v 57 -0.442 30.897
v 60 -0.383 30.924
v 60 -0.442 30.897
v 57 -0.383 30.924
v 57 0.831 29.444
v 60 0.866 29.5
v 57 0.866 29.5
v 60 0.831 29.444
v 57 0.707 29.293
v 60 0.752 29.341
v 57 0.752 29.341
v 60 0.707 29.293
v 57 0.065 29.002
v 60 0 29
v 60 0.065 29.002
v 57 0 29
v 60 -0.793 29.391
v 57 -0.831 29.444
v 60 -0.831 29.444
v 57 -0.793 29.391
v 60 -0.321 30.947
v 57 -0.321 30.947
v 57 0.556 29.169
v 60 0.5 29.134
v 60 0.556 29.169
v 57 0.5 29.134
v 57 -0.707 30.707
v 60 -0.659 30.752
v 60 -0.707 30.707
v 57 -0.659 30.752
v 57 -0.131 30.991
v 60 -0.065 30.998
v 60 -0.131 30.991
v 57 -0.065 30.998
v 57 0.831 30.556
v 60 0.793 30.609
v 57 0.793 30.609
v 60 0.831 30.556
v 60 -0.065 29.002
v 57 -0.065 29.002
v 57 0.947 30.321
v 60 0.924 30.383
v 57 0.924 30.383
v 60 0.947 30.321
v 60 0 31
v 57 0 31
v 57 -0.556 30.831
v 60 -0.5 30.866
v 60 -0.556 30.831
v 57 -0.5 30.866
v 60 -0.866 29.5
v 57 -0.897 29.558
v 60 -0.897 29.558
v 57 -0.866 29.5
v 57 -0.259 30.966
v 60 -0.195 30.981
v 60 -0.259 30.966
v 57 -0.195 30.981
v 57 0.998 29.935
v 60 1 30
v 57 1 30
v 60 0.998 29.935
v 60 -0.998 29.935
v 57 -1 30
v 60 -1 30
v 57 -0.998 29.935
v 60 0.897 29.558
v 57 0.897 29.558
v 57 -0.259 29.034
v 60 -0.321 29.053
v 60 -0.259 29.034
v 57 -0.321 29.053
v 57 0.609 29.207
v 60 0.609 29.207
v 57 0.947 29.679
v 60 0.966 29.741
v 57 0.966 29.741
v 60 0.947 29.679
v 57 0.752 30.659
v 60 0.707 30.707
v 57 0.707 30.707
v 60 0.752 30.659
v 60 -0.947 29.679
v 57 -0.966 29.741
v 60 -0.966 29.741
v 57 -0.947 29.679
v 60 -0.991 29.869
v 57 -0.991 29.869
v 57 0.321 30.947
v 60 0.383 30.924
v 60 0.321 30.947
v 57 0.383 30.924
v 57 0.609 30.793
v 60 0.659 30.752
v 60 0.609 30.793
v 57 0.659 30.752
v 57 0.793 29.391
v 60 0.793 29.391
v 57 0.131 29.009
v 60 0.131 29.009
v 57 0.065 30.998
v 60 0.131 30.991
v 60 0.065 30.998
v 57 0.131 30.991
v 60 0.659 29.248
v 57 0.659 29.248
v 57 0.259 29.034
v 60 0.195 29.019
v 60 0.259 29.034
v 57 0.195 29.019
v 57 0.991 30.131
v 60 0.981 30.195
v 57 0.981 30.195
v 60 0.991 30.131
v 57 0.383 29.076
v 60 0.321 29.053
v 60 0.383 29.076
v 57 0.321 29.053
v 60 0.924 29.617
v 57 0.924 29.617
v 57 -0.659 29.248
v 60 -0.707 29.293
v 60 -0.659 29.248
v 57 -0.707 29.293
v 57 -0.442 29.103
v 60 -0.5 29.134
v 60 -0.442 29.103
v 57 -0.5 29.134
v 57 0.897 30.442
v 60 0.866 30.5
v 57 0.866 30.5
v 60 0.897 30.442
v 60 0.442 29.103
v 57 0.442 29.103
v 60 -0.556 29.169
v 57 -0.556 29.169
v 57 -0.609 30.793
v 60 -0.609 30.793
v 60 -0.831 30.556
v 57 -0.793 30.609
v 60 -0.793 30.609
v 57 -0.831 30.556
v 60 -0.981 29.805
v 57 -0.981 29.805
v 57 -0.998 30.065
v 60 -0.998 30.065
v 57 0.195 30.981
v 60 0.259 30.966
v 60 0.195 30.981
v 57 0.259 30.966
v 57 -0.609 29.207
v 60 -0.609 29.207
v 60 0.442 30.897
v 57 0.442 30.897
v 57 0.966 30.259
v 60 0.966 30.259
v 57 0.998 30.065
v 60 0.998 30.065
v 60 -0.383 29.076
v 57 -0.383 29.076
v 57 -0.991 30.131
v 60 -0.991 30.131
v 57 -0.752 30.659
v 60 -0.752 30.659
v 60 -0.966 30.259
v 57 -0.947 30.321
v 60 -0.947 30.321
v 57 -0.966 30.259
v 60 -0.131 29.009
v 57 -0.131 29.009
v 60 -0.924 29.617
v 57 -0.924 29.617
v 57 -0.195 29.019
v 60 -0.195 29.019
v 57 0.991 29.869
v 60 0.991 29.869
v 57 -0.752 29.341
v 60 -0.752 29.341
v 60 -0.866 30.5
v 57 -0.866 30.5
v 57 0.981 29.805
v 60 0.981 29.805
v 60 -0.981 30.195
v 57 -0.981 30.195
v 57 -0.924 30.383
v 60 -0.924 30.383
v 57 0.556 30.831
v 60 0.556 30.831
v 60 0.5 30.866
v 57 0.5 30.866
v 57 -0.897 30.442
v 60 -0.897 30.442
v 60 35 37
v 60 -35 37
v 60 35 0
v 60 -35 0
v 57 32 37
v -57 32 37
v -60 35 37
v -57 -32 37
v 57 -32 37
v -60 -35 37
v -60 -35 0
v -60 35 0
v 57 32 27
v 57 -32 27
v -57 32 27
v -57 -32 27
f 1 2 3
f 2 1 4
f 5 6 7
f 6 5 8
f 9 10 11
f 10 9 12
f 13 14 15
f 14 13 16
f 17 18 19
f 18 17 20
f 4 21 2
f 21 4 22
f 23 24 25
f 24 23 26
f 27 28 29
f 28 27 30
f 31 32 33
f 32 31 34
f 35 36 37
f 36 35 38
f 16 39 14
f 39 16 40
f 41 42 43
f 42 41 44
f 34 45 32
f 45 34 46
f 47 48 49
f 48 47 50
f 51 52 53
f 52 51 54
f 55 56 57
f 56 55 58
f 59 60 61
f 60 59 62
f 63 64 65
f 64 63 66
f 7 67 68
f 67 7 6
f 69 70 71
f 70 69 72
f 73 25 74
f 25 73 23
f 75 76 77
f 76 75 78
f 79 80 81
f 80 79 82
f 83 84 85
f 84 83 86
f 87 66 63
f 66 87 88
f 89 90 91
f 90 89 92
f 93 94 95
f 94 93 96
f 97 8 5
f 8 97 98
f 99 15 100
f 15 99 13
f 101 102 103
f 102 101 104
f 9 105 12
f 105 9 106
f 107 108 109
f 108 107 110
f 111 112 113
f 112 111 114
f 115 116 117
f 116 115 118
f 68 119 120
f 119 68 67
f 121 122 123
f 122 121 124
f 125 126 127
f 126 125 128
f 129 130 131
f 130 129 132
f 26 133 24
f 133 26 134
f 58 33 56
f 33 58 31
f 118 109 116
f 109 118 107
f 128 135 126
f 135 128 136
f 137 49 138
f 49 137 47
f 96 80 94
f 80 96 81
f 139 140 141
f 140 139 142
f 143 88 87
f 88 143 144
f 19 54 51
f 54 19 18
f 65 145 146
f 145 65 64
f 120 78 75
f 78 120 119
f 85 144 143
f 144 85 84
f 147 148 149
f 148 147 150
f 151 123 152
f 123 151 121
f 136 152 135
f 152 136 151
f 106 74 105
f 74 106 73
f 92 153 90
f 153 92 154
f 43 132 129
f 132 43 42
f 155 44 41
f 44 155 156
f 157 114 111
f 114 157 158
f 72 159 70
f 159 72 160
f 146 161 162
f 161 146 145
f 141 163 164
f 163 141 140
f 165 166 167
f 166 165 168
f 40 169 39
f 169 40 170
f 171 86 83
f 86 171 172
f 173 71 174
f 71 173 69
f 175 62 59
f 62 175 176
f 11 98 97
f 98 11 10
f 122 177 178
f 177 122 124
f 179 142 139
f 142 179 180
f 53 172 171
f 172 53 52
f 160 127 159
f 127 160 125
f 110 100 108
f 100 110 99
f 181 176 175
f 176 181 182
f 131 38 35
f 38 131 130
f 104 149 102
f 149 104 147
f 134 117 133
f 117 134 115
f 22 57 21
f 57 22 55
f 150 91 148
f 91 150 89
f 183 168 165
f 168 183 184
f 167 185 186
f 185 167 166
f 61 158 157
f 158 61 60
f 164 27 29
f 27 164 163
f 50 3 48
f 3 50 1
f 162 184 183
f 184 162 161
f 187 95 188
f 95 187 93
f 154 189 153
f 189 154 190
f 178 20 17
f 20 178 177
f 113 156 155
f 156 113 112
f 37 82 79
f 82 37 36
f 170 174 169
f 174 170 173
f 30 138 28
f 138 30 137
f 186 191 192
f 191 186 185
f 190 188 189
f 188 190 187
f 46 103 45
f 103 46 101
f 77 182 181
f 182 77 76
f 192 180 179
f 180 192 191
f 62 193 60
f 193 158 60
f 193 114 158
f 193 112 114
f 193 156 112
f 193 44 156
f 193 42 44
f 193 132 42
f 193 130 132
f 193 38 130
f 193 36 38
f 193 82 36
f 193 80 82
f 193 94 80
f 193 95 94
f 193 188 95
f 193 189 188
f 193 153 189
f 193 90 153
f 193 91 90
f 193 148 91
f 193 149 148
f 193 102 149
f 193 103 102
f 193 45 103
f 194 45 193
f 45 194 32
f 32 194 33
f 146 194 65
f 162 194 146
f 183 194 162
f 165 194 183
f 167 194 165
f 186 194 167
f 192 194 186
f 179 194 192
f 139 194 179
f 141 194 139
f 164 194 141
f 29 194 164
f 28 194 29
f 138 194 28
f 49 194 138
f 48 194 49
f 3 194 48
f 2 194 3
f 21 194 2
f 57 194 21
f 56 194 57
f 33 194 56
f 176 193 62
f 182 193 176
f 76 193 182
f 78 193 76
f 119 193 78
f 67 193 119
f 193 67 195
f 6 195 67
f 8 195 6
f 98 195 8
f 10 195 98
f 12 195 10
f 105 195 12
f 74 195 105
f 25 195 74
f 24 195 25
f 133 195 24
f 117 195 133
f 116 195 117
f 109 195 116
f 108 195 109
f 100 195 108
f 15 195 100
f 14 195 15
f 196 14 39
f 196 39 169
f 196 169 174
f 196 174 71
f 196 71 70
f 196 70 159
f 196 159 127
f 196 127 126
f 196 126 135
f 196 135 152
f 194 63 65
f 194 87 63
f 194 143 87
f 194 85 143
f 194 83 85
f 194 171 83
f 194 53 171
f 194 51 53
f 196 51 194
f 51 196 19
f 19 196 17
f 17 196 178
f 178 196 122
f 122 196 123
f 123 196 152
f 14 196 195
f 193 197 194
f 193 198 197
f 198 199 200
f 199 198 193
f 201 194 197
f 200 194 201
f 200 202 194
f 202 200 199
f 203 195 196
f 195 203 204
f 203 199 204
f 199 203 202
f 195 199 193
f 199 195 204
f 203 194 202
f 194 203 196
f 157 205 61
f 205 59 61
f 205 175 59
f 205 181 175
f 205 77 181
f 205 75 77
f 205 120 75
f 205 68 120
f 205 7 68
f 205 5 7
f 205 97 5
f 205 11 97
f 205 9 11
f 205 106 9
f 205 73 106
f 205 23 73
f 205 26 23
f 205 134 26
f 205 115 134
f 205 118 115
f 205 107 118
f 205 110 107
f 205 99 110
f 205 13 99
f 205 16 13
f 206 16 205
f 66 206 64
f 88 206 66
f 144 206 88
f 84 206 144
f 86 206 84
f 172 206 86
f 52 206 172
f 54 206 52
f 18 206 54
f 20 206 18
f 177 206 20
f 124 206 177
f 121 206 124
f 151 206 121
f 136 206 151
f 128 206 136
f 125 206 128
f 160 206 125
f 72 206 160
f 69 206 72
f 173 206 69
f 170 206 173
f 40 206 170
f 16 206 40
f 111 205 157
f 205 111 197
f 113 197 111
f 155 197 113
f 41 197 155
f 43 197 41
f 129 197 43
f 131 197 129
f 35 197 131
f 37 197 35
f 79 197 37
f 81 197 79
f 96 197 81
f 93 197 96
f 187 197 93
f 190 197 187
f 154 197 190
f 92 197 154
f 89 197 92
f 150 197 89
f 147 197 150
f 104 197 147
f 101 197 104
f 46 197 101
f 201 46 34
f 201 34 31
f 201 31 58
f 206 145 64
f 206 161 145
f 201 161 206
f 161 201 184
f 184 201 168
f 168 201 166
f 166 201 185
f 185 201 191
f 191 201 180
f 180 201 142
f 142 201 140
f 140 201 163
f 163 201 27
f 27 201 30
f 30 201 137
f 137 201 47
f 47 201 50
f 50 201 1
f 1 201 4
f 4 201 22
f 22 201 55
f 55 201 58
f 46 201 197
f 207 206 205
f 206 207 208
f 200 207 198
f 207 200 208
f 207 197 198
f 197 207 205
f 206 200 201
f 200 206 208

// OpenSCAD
// Mini horizontal gel-electrophoresis buffer tank
// Print orientation: open top facing up (+Z), resting on XY plane at z = 0

// ---------------- Parameters ----------------
tank_x      = 120;   // outer length in X (mm)
tank_y      = 70;    // outer width in Y (mm)
tank_z      = 40;    // outer height in Z (mm)
wall        = 3;     // wall thickness (mm)
floor       = 3;     // floor thickness (mm)

platform_x  = 60;    // platform length in X (mm), centred
platform_z  = 10;    // platform top height above inner floor (mm) -> z = 10

hole_d      = 2;     // electrode hole diameter (mm)
hole_y      = 0;     // hole centre Y (mm)
hole_z      = 30;    // hole centre Z (mm)

eps         = 0.5;   // cutter overshoot past faces (mm)
$fn         = 96;    // curve resolution

// ---------------- Derived ----------------
inner_x = tank_x - 2 * wall;   // 114
inner_y = tank_y - 2 * wall;   // 64
inner_z = tank_z - floor;      // 37

// ---------------- Model ----------------
difference() {
    // Tank body (open top)
    translate([-tank_x / 2, -tank_y / 2, 0])
        cube([tank_x, tank_y, tank_z - floor]);

    // Raised gel-tray platform, full inner width, centred in X
    translate([-inner_x / 2, -inner_y / 2, inner_z - platform_z])
        cube([inner_x, inner_y, platform_z]);

    // Horizontal electrode holes through each end wall along X
    for (sx = [-1, 1])
        translate([sx * (inner_x / 2 - eps), hole_y, hole_z])
            rotate([0, 90, 0])
                cylinder(d = hole_d, h = tank_x + 2 * eps);
}
